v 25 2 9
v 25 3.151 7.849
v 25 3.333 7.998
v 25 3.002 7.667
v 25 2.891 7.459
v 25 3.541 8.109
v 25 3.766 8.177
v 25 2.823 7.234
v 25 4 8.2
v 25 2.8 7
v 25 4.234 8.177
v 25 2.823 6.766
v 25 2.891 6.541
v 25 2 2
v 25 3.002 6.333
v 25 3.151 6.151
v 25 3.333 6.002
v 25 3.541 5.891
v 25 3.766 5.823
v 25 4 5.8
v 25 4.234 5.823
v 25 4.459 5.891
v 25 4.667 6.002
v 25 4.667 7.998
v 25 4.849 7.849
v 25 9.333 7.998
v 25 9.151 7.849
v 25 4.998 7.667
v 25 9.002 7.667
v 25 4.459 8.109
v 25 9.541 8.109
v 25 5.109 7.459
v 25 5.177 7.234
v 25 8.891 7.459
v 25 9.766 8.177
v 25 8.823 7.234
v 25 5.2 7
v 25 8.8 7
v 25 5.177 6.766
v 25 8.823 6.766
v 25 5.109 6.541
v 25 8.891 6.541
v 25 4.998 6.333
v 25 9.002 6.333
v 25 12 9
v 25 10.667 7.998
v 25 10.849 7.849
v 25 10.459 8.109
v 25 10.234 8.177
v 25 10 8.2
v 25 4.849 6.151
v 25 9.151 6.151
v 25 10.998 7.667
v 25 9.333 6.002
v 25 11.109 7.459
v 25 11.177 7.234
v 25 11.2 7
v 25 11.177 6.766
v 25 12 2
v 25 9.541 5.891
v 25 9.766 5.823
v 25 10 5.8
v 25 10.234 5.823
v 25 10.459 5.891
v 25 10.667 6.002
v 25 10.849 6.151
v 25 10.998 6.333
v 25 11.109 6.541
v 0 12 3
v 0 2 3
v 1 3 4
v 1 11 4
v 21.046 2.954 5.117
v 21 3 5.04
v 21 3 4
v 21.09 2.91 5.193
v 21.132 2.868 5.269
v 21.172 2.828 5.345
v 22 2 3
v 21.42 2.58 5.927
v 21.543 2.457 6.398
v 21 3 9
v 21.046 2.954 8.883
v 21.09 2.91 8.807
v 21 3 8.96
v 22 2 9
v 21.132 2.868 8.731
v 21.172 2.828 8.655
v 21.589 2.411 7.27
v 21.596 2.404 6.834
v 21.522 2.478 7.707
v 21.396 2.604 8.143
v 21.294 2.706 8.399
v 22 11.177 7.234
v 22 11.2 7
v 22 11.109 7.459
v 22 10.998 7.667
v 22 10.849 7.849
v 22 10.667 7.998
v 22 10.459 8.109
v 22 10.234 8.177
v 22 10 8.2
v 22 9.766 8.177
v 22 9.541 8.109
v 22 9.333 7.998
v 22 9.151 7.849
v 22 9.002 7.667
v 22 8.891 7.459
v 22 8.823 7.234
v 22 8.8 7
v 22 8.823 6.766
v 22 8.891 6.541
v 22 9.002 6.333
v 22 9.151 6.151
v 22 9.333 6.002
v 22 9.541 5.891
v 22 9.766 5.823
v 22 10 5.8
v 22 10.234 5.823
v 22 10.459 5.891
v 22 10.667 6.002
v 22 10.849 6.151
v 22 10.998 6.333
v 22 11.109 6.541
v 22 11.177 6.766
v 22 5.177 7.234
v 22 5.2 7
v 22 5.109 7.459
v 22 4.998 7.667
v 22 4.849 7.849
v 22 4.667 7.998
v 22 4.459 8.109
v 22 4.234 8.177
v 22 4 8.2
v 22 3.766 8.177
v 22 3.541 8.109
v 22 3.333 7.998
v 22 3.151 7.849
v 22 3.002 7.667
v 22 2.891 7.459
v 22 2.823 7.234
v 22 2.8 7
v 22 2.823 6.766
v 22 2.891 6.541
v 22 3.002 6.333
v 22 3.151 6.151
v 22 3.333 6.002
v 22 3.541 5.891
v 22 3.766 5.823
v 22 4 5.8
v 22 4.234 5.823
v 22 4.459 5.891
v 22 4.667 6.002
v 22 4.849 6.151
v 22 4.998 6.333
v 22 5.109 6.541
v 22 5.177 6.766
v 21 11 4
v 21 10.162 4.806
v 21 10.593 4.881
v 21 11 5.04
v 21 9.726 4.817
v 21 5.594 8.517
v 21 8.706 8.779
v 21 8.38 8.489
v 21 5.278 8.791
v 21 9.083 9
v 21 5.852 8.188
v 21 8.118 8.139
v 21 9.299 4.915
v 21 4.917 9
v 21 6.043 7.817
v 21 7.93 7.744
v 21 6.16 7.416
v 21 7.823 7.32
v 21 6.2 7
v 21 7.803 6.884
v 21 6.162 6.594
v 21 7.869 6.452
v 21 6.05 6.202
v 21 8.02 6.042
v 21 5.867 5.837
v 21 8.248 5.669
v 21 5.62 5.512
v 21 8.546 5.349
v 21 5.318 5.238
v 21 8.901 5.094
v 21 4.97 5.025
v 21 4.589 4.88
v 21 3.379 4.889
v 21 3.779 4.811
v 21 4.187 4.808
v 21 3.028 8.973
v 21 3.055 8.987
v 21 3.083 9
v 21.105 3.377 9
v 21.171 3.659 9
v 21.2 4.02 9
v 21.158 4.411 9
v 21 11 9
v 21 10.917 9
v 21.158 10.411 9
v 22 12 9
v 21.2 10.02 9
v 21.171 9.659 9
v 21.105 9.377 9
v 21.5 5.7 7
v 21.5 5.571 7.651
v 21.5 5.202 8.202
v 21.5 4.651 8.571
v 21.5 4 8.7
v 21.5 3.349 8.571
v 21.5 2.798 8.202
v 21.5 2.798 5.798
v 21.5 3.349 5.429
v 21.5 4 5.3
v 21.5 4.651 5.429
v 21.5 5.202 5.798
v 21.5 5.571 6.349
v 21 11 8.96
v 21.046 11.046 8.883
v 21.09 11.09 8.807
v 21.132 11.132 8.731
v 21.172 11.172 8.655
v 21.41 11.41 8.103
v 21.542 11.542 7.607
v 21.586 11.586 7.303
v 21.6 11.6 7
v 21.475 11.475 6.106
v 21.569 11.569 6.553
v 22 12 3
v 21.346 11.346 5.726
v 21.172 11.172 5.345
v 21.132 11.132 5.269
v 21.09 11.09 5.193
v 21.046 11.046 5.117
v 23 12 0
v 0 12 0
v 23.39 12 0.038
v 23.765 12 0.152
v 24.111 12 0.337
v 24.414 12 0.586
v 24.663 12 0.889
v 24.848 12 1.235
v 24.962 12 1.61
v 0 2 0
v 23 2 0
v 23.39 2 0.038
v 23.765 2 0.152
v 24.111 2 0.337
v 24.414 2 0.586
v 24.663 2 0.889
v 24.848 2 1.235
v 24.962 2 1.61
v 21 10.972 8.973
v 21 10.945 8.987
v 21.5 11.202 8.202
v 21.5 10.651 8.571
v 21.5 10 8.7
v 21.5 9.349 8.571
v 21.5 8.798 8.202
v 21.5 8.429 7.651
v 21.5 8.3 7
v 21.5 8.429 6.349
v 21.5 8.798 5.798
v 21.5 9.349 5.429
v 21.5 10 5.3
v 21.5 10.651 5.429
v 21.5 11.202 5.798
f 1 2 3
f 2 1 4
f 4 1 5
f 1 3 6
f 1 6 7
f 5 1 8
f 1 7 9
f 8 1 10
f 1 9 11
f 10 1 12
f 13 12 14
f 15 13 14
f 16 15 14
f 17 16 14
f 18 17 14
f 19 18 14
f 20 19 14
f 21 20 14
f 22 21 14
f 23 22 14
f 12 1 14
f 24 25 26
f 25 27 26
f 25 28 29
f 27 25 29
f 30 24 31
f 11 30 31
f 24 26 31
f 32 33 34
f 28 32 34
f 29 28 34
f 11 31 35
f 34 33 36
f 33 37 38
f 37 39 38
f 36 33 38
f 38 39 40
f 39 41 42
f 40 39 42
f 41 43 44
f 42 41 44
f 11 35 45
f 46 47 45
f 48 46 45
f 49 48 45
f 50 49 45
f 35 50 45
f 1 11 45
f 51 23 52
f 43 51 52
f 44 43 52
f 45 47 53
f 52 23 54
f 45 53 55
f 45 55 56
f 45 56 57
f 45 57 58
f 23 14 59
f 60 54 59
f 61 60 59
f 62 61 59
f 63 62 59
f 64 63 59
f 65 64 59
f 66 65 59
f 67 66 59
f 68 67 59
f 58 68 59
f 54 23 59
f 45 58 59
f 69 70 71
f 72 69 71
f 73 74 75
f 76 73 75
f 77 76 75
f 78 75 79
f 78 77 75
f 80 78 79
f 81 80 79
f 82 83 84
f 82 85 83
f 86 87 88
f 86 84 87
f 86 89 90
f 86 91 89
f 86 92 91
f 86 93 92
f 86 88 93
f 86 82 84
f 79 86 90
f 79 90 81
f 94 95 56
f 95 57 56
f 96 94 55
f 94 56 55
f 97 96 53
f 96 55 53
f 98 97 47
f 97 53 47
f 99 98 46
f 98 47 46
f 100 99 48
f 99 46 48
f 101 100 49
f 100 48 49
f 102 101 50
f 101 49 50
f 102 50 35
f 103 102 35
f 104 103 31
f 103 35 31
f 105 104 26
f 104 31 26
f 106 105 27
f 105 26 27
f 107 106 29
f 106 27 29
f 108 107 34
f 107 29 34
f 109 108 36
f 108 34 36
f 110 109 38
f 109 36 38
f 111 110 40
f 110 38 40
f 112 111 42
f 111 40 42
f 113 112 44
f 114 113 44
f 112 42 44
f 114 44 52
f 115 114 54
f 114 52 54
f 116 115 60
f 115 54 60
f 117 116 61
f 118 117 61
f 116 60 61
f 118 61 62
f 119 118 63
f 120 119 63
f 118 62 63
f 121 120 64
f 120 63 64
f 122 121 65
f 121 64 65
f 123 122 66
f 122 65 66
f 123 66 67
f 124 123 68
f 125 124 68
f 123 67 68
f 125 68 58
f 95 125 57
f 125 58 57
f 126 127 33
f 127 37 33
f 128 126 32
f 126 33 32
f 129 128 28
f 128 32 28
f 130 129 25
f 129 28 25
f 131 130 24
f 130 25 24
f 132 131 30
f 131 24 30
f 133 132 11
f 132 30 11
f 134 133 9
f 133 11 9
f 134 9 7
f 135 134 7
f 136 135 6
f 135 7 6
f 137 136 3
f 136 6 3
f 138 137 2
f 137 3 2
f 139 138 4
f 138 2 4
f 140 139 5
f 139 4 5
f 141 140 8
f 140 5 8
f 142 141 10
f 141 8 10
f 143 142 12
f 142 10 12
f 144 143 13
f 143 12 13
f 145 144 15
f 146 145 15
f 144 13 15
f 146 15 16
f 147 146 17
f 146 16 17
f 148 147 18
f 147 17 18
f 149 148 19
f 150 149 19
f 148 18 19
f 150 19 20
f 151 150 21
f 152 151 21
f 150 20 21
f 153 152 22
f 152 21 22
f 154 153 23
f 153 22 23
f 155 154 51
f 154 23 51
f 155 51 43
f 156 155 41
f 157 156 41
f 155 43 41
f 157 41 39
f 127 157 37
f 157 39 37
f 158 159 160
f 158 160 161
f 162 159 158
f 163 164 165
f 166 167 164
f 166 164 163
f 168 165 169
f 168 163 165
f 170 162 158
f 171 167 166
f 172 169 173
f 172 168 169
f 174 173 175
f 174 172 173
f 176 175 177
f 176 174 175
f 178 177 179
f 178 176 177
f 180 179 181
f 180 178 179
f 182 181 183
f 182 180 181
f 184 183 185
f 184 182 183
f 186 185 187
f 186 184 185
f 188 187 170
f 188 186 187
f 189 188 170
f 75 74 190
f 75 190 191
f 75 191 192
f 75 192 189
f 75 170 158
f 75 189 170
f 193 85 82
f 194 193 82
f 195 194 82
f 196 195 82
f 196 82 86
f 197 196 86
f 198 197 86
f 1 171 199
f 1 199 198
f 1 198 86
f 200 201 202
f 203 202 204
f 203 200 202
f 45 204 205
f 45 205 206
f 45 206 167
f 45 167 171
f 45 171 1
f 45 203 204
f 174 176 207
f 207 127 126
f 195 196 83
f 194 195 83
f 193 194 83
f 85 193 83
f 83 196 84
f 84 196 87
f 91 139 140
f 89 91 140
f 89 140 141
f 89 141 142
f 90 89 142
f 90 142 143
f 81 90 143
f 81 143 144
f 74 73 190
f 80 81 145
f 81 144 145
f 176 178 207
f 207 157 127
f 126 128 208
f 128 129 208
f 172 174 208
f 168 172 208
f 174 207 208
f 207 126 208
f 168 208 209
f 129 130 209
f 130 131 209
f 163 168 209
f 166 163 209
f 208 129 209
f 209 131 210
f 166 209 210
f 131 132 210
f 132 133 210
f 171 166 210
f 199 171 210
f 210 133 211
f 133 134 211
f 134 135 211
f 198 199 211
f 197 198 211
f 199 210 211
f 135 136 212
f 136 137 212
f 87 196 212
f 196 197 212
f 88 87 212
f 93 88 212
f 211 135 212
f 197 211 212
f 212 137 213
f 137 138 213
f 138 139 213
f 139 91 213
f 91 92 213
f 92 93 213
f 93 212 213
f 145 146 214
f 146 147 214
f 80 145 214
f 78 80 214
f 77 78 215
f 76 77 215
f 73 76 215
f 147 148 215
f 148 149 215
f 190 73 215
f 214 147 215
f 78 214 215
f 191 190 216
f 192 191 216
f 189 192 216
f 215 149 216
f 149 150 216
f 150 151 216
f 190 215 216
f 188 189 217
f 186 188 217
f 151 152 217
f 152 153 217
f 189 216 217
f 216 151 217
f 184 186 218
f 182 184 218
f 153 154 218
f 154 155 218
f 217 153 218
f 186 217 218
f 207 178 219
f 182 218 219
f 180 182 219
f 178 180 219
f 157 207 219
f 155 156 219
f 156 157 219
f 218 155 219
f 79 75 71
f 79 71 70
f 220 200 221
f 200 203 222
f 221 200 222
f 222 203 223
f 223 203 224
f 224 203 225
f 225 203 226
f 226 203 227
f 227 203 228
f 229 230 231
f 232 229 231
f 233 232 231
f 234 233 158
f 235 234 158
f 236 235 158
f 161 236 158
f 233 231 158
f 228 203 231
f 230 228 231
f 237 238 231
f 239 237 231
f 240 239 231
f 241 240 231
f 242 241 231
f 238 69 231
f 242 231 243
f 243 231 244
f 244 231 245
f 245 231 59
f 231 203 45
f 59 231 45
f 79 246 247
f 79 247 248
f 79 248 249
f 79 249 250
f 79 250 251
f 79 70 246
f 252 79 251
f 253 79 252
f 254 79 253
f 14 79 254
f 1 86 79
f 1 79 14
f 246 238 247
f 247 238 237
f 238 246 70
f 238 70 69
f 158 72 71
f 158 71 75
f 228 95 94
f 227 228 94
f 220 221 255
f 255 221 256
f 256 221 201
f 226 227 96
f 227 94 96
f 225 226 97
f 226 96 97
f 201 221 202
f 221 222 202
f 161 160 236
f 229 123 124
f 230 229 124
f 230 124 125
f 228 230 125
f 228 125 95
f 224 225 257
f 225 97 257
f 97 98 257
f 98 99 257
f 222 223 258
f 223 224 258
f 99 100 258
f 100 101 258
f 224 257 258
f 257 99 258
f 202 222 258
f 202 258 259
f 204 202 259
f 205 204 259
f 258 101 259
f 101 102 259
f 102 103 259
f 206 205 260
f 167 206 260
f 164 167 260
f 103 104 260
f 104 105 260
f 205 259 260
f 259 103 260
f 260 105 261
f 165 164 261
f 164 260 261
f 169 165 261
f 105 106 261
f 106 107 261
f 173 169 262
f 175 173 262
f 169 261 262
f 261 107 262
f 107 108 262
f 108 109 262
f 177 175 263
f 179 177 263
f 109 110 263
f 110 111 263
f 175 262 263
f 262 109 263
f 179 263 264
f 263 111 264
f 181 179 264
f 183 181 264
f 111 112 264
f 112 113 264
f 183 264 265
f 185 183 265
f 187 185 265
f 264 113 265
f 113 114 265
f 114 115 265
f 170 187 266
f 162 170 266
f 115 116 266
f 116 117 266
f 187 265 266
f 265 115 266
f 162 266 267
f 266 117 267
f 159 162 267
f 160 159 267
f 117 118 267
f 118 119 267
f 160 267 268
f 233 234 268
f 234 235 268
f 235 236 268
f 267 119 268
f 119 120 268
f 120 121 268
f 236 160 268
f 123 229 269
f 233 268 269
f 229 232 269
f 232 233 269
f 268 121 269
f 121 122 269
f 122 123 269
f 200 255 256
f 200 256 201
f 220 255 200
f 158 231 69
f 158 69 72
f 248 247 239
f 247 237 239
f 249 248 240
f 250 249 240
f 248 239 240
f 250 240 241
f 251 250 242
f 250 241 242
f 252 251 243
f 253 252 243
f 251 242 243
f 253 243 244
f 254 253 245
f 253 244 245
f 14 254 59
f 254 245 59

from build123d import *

# Parameters (mm, degrees)
ESBO_O1_W                                            = 25
ESBO_O1_H                                            = 14
RESSALTO_EXTRUS_O1_DEPTH                             = 4
ESBO_O2_W                                            = 4
ESBO_O2_H                                            = 14
RESSALTO_EXTRUS_O2_DEPTH                             = 5
ESBO_O4_W                                            = 25
ESBO_O4_H                                            = 2
CORTE_EXTRUS_O1_DEPTH                                = 31.033314835
ESCAREADO_PARA_PARAFUSO_COM_CABE_A_ESCAR_D           = 2.4
ESCAREADO_PARA_PARAFUSO_COM_CABE_A_ESCAR_DEPTH       = 15
ESCAREADO_PARA_PARAFUSO_COM_CABE_A_ESCAR_CSINK_D     = 4.4
ESCAREADO_PARA_PARAFUSO_COM_CABE_A_ESCAR_CSINK_ANGLE = 90
ESCAREADO_PARA_PARAFUSO_COM_CABE_A_ESCAR_TIP         = 0.721032743
FILETE1_R                                            = 2
CHANFRO1_SIZE                                        = 1


with BuildPart() as part:
    # Esboço1 → Ressalto-extrusão1 (new body)
    with BuildSketch(Plane.XY):
        with Locations((12.5, 7)):
            Rectangle(ESBO_O1_W, ESBO_O1_H)
    extrude(amount=RESSALTO_EXTRUS_O1_DEPTH)

    # Esboço2 → Ressalto-extrusão2 (add)
    with BuildSketch(Plane.XY.offset(4)):
        with Locations((23, 7)):
            Rectangle(ESBO_O2_W, ESBO_O2_H)
    extrude(amount=RESSALTO_EXTRUS_O2_DEPTH)

    # Esboço4 → Corte-extrusão1 (cut, through all)
    with BuildSketch(Plane.XY.offset(9)):
        with Locations((12.5, 13)):
            Rectangle(ESBO_O4_W, ESBO_O4_H)
        with Locations((12.5, 1)):
            Rectangle(ESBO_O4_W, ESBO_O4_H)
    extrude(amount=-CORTE_EXTRUS_O1_DEPTH, mode=Mode.SUBTRACT)

    # Escareado para parafuso com cabeça escareada chata de M21
    with Locations(Plane(origin=(21, 10, 7), x_dir=(0, -1, 0), z_dir=(-1, 0, 0))):
        with Locations((0, 0), (6, 0)):
            CounterSinkHole(ESCAREADO_PARA_PARAFUSO_COM_CABE_A_ESCAR_D / 2, ESCAREADO_PARA_PARAFUSO_COM_CABE_A_ESCAR_CSINK_D / 2, depth=ESCAREADO_PARA_PARAFUSO_COM_CABE_A_ESCAR_DEPTH, counter_sink_angle=ESCAREADO_PARA_PARAFUSO_COM_CABE_A_ESCAR_CSINK_ANGLE)
            with Locations((0, 0, -(ESCAREADO_PARA_PARAFUSO_COM_CABE_A_ESCAR_DEPTH + ESCAREADO_PARA_PARAFUSO_COM_CABE_A_ESCAR_TIP / 2))):  # 118° drill point
                Cone(0, ESCAREADO_PARA_PARAFUSO_COM_CABE_A_ESCAR_D / 2, ESCAREADO_PARA_PARAFUSO_COM_CABE_A_ESCAR_TIP, mode=Mode.SUBTRACT)

    # Filete1
    filete1_edges = [part.edges().sort_by_distance(p)[0] for p in [
        (25, 7, 0),
    ]]
    fillet(filete1_edges, radius=FILETE1_R)

    # Chanfro1
    # the kernel refuses this chamfer: 1 mm, written as the material it takes off along each edge
    with BuildSketch(Plane(origin=(0, 14.571682988, 4), x_dir=(-0.027495876610586365, 0, -0.9996219169112968), z_dir=(0, -1, 0))) as chanfro1_piece_1:
        Polygon((CHANFRO1_SIZE * 0.999621916911, CHANFRO1_SIZE * 0.0274958766106), (-CHANFRO1_SIZE * 0.0274958766106, CHANFRO1_SIZE * 0.999621916911), (0, 0), align=None)
    extrude(amount=15.143365976, mode=Mode.SUBTRACT)
    with BuildSketch(Plane(origin=(21, 12, 4), x_dir=(0, 0.02749587661058735, -0.9996219169112968), z_dir=(-1, 0, 0))) as chanfro1_piece_2:
        Polygon((CHANFRO1_SIZE * 0.999621916911, CHANFRO1_SIZE * 0.0274958766106), (-CHANFRO1_SIZE * 0.0274958766106, CHANFRO1_SIZE * 0.999621916911), (0, 0), align=None)
    extrude(amount=23.571682988, mode=Mode.SUBTRACT)
    with BuildSketch(Plane(origin=(21, 12, 5.344832151), x_dir=(0.9996219169112968, 0.027495876610585647, 0), z_dir=(0, 0, 1)), Plane(origin=(21, 2, 11.571682988), x_dir=(0.9996219169112968, -0.027495876610586726, 0), z_dir=(0, 0, -1))) as chanfro1_piece_3:
        Polygon((CHANFRO1_SIZE * 0.999621916911, -CHANFRO1_SIZE * 0.0274958766106), (-CHANFRO1_SIZE * 0.0274958766106, -CHANFRO1_SIZE * 0.999621916911), (0, 0), align=None)
    extrude(amount=6.226850837, mode=Mode.SUBTRACT)
    with BuildSketch(Plane(origin=(-2.571682988, 2, 4), x_dir=(0, 0.9996219169112968, 0.027495876610586487), z_dir=(1, 0, 0))) as chanfro1_piece_4:
        Polygon((CHANFRO1_SIZE * 0.999621916911, -CHANFRO1_SIZE * 0.0274958766106), (-CHANFRO1_SIZE * 0.0274958766106, -CHANFRO1_SIZE * 0.999621916911), (0, 0), align=None)
    extrude(amount=23.571682988, mode=Mode.SUBTRACT)
    with BuildSketch(Plane(origin=(21, 2, 8.655167849), x_dir=(-0.027495876610585623, 0.9996219169112968, 0), z_dir=(0, 0, -1))) as chanfro1_piece_5:
        Polygon((CHANFRO1_SIZE * 0.999621916911, CHANFRO1_SIZE * 0.0274958766106), (-CHANFRO1_SIZE * 0.0274958766106, CHANFRO1_SIZE * 0.999621916911), (0, 0), align=None)
    extrude(amount=4.655167849, mode=Mode.SUBTRACT)
    with BuildSketch(Plane(origin=(21, 12, 4), x_dir=(0.9996219169112968, 0.027495876610585647, 0), z_dir=(0, 0, 1))) as chanfro1_piece_6:
        Polygon((CHANFRO1_SIZE * 0.999621916911, -CHANFRO1_SIZE * 0.0274958766106), (-CHANFRO1_SIZE * 0.0274958766106, -CHANFRO1_SIZE * 0.999621916911), (0, 0), align=None)
    extrude(amount=4.655167849, mode=Mode.SUBTRACT)
    with BuildSketch(Plane(origin=(23.571682988, 12, 4), x_dir=(0, 0.027495876610585623, -0.9996219169112968), z_dir=(-1, 0, 0))) as chanfro1_piece_7a_section:
        Polygon((CHANFRO1_SIZE * 0.999621916911, CHANFRO1_SIZE * 0.0274958766106), (-CHANFRO1_SIZE * 0.0274958766106, CHANFRO1_SIZE * 0.999621916911), (0, 0), align=None)
    chanfro1_piece_7a = extrude(amount=26.143365976, mode=Mode.PRIVATE)
    chanfro1_piece_7a = split(chanfro1_piece_7a, bisect_by=Plane(origin=(21, 11.670206373, 3.670206373), z_dir=(1, 0, 0)), keep=Keep.TOP, mode=Mode.PRIVATE)
    with BuildSketch(Plane(origin=(21, 12, 1.428317012), x_dir=(0.9996219169112968, 0.027495876610585647, 0), z_dir=(0, 0, 1))) as chanfro1_piece_7b_section:
        Polygon((CHANFRO1_SIZE * 0.999621916911, -CHANFRO1_SIZE * 0.0274958766106), (-CHANFRO1_SIZE * 0.0274958766106, -CHANFRO1_SIZE * 0.999621916911), (0, 0), align=None)
    chanfro1_piece_7b = extrude(amount=7.226850837, mode=Mode.PRIVATE)
    chanfro1_piece_7b = split(chanfro1_piece_7b, bisect_by=Plane(origin=(21.329793627, 11.670206373, 4), z_dir=(0, 0, -1)), keep=Keep.TOP, mode=Mode.PRIVATE)
    chanfro1_piece_7 = chanfro1_piece_7a & chanfro1_piece_7b
    add(chanfro1_piece_7, mode=Mode.SUBTRACT)
    with BuildSketch(Plane(origin=(-2.571682988, 2, 4), x_dir=(0, 0.9996219169112968, 0.027495876610586487), z_dir=(1, 0, 0))) as chanfro1_piece_8a_section:
        Polygon((CHANFRO1_SIZE * 0.999621916911, -CHANFRO1_SIZE * 0.0274958766106), (-CHANFRO1_SIZE * 0.0274958766106, -CHANFRO1_SIZE * 0.999621916911), (0, 0), align=None)
    chanfro1_piece_8a = extrude(amount=26.143365976, mode=Mode.PRIVATE)
    chanfro1_piece_8a = split(chanfro1_piece_8a, bisect_by=Plane(origin=(21, 2.329793627, 3.670206373), z_dir=(1, 0, 0)), keep=Keep.TOP, mode=Mode.PRIVATE)
    with BuildSketch(Plane(origin=(21, 2, 8.655167849), x_dir=(-0.027495876610585623, 0.9996219169112968, 0), z_dir=(0, 0, -1))) as chanfro1_piece_8b_section:
        Polygon((CHANFRO1_SIZE * 0.999621916911, CHANFRO1_SIZE * 0.0274958766106), (-CHANFRO1_SIZE * 0.0274958766106, CHANFRO1_SIZE * 0.999621916911), (0, 0), align=None)
    chanfro1_piece_8b = extrude(amount=7.226850837, mode=Mode.PRIVATE)
    chanfro1_piece_8b = split(chanfro1_piece_8b, bisect_by=Plane(origin=(21.329793627, 2.329793627, 4), z_dir=(0, 0, -1)), keep=Keep.TOP, mode=Mode.PRIVATE)
    chanfro1_piece_8 = chanfro1_piece_8a & chanfro1_piece_8b
    add(chanfro1_piece_8, mode=Mode.SUBTRACT)


solid = part.part
